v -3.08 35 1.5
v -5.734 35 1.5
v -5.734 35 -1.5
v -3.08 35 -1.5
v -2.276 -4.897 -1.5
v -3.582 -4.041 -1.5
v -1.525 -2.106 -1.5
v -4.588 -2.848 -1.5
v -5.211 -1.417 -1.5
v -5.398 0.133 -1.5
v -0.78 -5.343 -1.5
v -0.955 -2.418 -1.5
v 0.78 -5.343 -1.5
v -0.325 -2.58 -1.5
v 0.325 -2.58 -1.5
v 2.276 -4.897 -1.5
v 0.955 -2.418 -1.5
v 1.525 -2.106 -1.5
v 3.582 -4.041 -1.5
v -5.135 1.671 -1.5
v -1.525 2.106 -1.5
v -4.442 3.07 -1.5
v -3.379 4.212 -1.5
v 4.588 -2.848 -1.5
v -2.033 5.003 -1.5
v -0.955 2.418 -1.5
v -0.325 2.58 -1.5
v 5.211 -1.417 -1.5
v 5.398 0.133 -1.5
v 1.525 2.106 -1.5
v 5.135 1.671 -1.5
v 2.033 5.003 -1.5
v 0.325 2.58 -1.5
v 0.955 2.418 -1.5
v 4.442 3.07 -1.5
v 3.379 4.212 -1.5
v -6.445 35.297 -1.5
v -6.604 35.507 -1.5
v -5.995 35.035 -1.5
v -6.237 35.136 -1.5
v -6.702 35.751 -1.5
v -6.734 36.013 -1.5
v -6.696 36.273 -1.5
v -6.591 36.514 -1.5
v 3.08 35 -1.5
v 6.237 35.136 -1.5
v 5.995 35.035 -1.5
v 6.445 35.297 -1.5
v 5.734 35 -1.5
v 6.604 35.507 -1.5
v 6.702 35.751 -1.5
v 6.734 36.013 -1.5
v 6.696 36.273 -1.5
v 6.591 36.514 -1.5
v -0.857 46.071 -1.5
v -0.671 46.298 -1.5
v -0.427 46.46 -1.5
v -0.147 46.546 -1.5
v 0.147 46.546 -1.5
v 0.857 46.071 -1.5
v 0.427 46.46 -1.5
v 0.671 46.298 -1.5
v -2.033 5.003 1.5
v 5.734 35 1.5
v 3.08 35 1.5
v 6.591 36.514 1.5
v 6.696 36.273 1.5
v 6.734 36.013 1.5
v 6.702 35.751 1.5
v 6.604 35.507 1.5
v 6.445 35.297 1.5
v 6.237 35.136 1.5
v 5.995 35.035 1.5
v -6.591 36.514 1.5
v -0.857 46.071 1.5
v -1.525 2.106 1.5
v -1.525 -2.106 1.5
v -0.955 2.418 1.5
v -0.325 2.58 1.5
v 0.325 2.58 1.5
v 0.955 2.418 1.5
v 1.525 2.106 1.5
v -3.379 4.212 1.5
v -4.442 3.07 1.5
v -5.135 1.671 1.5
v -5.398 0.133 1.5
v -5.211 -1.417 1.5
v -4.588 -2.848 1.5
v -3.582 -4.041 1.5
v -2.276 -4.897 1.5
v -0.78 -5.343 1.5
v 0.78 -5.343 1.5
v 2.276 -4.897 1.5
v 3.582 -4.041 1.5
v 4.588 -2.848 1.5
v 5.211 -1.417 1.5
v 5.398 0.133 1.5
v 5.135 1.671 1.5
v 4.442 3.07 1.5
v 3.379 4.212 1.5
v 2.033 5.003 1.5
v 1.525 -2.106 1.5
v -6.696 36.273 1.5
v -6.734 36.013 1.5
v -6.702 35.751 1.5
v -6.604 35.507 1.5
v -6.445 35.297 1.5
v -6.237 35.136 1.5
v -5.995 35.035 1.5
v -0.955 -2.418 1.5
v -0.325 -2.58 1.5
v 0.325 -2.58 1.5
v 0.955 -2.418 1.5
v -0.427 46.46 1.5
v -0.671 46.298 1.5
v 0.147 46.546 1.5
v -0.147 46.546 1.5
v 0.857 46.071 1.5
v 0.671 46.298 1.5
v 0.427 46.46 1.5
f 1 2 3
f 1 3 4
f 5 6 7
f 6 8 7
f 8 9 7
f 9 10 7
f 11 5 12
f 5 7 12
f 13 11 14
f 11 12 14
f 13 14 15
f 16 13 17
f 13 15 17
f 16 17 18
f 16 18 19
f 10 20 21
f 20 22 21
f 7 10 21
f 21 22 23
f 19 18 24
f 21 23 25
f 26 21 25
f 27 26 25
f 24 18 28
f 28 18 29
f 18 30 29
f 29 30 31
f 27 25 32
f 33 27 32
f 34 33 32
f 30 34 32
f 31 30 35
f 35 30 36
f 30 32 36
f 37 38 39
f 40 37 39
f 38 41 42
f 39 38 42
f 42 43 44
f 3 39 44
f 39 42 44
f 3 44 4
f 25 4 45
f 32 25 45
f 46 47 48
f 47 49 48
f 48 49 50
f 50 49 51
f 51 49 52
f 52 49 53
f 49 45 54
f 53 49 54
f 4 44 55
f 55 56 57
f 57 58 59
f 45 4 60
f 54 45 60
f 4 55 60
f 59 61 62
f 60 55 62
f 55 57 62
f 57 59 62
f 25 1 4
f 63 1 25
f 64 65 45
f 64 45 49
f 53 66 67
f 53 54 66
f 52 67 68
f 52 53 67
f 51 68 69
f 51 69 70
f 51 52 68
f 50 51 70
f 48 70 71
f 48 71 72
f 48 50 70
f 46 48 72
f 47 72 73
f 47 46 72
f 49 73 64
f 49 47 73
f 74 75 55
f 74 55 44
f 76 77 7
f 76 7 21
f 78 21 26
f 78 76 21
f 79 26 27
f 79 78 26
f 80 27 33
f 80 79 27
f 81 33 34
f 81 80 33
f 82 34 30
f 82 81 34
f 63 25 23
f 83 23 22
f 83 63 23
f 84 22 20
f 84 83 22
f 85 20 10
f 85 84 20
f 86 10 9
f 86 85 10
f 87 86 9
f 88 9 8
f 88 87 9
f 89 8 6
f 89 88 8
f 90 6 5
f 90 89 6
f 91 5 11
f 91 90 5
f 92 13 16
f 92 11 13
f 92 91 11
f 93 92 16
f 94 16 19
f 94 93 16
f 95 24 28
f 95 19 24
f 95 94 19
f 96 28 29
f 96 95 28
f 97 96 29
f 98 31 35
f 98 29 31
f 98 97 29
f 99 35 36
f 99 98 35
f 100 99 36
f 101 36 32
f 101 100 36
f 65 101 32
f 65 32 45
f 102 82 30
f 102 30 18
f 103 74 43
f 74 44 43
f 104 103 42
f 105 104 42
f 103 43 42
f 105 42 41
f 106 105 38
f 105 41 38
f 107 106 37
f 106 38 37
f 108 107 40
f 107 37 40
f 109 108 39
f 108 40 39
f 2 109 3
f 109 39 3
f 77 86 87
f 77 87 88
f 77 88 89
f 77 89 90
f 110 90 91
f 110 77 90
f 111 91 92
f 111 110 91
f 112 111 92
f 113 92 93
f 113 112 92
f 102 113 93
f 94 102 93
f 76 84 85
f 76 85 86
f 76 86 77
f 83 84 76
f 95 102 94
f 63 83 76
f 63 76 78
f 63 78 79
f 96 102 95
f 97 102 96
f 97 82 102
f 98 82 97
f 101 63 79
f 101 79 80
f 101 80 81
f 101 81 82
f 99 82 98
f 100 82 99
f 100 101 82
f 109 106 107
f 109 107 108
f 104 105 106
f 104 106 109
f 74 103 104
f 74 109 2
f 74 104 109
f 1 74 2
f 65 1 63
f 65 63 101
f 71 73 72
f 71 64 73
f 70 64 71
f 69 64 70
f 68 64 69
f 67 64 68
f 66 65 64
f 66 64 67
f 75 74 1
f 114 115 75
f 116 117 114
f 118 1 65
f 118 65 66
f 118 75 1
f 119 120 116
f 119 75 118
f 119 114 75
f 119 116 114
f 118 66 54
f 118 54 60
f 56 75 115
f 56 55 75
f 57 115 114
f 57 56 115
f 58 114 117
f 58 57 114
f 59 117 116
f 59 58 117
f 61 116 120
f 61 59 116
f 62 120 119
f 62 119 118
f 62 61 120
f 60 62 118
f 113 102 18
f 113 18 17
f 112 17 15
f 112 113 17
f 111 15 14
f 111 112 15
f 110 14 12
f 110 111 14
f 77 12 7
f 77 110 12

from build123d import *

# Parameters (mm, degrees)
F0_R     = 5.4
F1_DEPTH = 1.5
F3_DEPTH = 1.5
F5_DEPTH = 3
F6_R     = 1


with BuildPart() as f1:
    # F0 (on Top) → F1 (new body, symmetric)
    with BuildSketch(Plane.XY):
        Circle(F0_R)
        with BuildLine():
            ThreePointArc((1.525, 2.1057955741), (2.3157072354, 1.1821590418), (2.6, 0))
            ThreePointArc((2.6, 0), (2.3157072354, -1.1821590418), (1.525, -2.1057955741))
            ThreePointArc((1.525, -2.1057955741), (0, -2.6), (-1.525, -2.1057955741))
            ThreePointArc((-1.525, -2.1057955741), (-2.6, 0), (-1.525, 2.1057955741))
            ThreePointArc((-1.525, 2.1057955741), (0, 2.6), (1.525, 2.1057955741))
        make_face(mode=Mode.SUBTRACT)
        with BuildLine():
            Line((-1.525, -2.1057955741), (-1.525, 2.1057955741))
            ThreePointArc((-1.525, 2.1057955741), (-2.6, 0), (-1.525, -2.1057955741))
        make_face()
        with BuildLine():
            ThreePointArc((1.525, -2.1057955741), (2.3157072354, -1.1821590418), (2.6, 0))
            ThreePointArc((2.6, 0), (2.3157072354, 1.1821590418), (1.525, 2.1057955741))
            Line((1.525, 2.1057955741), (1.525, -2.1057955741))
        make_face()
    extrude(amount=F1_DEPTH, both=True)

    # F2 (on Top) → F3 (join, symmetric)
    with BuildSketch(Plane.XY):
        Polygon((3.0802667684, 35), (0, 35), (-3.0802667684, 35), (-2, 4.0652072057), (0, 4.0652072057), (2, 4.0652072057), align=None)
    extrude(amount=F3_DEPTH, both=True)

    # F4 (on face) → F5 (join, through all)
    with BuildSketch(Plane.XY.offset(1.5)):
        Polygon((0, 47.5), (-7.5, 35), (-3.0802667684, 35), (3.0802667684, 35), (7.5, 35), align=None)
    extrude(amount=-F5_DEPTH)

    # F6
    f6_edges = [f1.edges().sort_by_distance(p)[0] for p in [
        (-7.5, 35, 0),
        (0, 47.5, 0),
        (7.5, 35, 0),
    ]]
    fillet(f6_edges, radius=F6_R)


solid = f1.part
